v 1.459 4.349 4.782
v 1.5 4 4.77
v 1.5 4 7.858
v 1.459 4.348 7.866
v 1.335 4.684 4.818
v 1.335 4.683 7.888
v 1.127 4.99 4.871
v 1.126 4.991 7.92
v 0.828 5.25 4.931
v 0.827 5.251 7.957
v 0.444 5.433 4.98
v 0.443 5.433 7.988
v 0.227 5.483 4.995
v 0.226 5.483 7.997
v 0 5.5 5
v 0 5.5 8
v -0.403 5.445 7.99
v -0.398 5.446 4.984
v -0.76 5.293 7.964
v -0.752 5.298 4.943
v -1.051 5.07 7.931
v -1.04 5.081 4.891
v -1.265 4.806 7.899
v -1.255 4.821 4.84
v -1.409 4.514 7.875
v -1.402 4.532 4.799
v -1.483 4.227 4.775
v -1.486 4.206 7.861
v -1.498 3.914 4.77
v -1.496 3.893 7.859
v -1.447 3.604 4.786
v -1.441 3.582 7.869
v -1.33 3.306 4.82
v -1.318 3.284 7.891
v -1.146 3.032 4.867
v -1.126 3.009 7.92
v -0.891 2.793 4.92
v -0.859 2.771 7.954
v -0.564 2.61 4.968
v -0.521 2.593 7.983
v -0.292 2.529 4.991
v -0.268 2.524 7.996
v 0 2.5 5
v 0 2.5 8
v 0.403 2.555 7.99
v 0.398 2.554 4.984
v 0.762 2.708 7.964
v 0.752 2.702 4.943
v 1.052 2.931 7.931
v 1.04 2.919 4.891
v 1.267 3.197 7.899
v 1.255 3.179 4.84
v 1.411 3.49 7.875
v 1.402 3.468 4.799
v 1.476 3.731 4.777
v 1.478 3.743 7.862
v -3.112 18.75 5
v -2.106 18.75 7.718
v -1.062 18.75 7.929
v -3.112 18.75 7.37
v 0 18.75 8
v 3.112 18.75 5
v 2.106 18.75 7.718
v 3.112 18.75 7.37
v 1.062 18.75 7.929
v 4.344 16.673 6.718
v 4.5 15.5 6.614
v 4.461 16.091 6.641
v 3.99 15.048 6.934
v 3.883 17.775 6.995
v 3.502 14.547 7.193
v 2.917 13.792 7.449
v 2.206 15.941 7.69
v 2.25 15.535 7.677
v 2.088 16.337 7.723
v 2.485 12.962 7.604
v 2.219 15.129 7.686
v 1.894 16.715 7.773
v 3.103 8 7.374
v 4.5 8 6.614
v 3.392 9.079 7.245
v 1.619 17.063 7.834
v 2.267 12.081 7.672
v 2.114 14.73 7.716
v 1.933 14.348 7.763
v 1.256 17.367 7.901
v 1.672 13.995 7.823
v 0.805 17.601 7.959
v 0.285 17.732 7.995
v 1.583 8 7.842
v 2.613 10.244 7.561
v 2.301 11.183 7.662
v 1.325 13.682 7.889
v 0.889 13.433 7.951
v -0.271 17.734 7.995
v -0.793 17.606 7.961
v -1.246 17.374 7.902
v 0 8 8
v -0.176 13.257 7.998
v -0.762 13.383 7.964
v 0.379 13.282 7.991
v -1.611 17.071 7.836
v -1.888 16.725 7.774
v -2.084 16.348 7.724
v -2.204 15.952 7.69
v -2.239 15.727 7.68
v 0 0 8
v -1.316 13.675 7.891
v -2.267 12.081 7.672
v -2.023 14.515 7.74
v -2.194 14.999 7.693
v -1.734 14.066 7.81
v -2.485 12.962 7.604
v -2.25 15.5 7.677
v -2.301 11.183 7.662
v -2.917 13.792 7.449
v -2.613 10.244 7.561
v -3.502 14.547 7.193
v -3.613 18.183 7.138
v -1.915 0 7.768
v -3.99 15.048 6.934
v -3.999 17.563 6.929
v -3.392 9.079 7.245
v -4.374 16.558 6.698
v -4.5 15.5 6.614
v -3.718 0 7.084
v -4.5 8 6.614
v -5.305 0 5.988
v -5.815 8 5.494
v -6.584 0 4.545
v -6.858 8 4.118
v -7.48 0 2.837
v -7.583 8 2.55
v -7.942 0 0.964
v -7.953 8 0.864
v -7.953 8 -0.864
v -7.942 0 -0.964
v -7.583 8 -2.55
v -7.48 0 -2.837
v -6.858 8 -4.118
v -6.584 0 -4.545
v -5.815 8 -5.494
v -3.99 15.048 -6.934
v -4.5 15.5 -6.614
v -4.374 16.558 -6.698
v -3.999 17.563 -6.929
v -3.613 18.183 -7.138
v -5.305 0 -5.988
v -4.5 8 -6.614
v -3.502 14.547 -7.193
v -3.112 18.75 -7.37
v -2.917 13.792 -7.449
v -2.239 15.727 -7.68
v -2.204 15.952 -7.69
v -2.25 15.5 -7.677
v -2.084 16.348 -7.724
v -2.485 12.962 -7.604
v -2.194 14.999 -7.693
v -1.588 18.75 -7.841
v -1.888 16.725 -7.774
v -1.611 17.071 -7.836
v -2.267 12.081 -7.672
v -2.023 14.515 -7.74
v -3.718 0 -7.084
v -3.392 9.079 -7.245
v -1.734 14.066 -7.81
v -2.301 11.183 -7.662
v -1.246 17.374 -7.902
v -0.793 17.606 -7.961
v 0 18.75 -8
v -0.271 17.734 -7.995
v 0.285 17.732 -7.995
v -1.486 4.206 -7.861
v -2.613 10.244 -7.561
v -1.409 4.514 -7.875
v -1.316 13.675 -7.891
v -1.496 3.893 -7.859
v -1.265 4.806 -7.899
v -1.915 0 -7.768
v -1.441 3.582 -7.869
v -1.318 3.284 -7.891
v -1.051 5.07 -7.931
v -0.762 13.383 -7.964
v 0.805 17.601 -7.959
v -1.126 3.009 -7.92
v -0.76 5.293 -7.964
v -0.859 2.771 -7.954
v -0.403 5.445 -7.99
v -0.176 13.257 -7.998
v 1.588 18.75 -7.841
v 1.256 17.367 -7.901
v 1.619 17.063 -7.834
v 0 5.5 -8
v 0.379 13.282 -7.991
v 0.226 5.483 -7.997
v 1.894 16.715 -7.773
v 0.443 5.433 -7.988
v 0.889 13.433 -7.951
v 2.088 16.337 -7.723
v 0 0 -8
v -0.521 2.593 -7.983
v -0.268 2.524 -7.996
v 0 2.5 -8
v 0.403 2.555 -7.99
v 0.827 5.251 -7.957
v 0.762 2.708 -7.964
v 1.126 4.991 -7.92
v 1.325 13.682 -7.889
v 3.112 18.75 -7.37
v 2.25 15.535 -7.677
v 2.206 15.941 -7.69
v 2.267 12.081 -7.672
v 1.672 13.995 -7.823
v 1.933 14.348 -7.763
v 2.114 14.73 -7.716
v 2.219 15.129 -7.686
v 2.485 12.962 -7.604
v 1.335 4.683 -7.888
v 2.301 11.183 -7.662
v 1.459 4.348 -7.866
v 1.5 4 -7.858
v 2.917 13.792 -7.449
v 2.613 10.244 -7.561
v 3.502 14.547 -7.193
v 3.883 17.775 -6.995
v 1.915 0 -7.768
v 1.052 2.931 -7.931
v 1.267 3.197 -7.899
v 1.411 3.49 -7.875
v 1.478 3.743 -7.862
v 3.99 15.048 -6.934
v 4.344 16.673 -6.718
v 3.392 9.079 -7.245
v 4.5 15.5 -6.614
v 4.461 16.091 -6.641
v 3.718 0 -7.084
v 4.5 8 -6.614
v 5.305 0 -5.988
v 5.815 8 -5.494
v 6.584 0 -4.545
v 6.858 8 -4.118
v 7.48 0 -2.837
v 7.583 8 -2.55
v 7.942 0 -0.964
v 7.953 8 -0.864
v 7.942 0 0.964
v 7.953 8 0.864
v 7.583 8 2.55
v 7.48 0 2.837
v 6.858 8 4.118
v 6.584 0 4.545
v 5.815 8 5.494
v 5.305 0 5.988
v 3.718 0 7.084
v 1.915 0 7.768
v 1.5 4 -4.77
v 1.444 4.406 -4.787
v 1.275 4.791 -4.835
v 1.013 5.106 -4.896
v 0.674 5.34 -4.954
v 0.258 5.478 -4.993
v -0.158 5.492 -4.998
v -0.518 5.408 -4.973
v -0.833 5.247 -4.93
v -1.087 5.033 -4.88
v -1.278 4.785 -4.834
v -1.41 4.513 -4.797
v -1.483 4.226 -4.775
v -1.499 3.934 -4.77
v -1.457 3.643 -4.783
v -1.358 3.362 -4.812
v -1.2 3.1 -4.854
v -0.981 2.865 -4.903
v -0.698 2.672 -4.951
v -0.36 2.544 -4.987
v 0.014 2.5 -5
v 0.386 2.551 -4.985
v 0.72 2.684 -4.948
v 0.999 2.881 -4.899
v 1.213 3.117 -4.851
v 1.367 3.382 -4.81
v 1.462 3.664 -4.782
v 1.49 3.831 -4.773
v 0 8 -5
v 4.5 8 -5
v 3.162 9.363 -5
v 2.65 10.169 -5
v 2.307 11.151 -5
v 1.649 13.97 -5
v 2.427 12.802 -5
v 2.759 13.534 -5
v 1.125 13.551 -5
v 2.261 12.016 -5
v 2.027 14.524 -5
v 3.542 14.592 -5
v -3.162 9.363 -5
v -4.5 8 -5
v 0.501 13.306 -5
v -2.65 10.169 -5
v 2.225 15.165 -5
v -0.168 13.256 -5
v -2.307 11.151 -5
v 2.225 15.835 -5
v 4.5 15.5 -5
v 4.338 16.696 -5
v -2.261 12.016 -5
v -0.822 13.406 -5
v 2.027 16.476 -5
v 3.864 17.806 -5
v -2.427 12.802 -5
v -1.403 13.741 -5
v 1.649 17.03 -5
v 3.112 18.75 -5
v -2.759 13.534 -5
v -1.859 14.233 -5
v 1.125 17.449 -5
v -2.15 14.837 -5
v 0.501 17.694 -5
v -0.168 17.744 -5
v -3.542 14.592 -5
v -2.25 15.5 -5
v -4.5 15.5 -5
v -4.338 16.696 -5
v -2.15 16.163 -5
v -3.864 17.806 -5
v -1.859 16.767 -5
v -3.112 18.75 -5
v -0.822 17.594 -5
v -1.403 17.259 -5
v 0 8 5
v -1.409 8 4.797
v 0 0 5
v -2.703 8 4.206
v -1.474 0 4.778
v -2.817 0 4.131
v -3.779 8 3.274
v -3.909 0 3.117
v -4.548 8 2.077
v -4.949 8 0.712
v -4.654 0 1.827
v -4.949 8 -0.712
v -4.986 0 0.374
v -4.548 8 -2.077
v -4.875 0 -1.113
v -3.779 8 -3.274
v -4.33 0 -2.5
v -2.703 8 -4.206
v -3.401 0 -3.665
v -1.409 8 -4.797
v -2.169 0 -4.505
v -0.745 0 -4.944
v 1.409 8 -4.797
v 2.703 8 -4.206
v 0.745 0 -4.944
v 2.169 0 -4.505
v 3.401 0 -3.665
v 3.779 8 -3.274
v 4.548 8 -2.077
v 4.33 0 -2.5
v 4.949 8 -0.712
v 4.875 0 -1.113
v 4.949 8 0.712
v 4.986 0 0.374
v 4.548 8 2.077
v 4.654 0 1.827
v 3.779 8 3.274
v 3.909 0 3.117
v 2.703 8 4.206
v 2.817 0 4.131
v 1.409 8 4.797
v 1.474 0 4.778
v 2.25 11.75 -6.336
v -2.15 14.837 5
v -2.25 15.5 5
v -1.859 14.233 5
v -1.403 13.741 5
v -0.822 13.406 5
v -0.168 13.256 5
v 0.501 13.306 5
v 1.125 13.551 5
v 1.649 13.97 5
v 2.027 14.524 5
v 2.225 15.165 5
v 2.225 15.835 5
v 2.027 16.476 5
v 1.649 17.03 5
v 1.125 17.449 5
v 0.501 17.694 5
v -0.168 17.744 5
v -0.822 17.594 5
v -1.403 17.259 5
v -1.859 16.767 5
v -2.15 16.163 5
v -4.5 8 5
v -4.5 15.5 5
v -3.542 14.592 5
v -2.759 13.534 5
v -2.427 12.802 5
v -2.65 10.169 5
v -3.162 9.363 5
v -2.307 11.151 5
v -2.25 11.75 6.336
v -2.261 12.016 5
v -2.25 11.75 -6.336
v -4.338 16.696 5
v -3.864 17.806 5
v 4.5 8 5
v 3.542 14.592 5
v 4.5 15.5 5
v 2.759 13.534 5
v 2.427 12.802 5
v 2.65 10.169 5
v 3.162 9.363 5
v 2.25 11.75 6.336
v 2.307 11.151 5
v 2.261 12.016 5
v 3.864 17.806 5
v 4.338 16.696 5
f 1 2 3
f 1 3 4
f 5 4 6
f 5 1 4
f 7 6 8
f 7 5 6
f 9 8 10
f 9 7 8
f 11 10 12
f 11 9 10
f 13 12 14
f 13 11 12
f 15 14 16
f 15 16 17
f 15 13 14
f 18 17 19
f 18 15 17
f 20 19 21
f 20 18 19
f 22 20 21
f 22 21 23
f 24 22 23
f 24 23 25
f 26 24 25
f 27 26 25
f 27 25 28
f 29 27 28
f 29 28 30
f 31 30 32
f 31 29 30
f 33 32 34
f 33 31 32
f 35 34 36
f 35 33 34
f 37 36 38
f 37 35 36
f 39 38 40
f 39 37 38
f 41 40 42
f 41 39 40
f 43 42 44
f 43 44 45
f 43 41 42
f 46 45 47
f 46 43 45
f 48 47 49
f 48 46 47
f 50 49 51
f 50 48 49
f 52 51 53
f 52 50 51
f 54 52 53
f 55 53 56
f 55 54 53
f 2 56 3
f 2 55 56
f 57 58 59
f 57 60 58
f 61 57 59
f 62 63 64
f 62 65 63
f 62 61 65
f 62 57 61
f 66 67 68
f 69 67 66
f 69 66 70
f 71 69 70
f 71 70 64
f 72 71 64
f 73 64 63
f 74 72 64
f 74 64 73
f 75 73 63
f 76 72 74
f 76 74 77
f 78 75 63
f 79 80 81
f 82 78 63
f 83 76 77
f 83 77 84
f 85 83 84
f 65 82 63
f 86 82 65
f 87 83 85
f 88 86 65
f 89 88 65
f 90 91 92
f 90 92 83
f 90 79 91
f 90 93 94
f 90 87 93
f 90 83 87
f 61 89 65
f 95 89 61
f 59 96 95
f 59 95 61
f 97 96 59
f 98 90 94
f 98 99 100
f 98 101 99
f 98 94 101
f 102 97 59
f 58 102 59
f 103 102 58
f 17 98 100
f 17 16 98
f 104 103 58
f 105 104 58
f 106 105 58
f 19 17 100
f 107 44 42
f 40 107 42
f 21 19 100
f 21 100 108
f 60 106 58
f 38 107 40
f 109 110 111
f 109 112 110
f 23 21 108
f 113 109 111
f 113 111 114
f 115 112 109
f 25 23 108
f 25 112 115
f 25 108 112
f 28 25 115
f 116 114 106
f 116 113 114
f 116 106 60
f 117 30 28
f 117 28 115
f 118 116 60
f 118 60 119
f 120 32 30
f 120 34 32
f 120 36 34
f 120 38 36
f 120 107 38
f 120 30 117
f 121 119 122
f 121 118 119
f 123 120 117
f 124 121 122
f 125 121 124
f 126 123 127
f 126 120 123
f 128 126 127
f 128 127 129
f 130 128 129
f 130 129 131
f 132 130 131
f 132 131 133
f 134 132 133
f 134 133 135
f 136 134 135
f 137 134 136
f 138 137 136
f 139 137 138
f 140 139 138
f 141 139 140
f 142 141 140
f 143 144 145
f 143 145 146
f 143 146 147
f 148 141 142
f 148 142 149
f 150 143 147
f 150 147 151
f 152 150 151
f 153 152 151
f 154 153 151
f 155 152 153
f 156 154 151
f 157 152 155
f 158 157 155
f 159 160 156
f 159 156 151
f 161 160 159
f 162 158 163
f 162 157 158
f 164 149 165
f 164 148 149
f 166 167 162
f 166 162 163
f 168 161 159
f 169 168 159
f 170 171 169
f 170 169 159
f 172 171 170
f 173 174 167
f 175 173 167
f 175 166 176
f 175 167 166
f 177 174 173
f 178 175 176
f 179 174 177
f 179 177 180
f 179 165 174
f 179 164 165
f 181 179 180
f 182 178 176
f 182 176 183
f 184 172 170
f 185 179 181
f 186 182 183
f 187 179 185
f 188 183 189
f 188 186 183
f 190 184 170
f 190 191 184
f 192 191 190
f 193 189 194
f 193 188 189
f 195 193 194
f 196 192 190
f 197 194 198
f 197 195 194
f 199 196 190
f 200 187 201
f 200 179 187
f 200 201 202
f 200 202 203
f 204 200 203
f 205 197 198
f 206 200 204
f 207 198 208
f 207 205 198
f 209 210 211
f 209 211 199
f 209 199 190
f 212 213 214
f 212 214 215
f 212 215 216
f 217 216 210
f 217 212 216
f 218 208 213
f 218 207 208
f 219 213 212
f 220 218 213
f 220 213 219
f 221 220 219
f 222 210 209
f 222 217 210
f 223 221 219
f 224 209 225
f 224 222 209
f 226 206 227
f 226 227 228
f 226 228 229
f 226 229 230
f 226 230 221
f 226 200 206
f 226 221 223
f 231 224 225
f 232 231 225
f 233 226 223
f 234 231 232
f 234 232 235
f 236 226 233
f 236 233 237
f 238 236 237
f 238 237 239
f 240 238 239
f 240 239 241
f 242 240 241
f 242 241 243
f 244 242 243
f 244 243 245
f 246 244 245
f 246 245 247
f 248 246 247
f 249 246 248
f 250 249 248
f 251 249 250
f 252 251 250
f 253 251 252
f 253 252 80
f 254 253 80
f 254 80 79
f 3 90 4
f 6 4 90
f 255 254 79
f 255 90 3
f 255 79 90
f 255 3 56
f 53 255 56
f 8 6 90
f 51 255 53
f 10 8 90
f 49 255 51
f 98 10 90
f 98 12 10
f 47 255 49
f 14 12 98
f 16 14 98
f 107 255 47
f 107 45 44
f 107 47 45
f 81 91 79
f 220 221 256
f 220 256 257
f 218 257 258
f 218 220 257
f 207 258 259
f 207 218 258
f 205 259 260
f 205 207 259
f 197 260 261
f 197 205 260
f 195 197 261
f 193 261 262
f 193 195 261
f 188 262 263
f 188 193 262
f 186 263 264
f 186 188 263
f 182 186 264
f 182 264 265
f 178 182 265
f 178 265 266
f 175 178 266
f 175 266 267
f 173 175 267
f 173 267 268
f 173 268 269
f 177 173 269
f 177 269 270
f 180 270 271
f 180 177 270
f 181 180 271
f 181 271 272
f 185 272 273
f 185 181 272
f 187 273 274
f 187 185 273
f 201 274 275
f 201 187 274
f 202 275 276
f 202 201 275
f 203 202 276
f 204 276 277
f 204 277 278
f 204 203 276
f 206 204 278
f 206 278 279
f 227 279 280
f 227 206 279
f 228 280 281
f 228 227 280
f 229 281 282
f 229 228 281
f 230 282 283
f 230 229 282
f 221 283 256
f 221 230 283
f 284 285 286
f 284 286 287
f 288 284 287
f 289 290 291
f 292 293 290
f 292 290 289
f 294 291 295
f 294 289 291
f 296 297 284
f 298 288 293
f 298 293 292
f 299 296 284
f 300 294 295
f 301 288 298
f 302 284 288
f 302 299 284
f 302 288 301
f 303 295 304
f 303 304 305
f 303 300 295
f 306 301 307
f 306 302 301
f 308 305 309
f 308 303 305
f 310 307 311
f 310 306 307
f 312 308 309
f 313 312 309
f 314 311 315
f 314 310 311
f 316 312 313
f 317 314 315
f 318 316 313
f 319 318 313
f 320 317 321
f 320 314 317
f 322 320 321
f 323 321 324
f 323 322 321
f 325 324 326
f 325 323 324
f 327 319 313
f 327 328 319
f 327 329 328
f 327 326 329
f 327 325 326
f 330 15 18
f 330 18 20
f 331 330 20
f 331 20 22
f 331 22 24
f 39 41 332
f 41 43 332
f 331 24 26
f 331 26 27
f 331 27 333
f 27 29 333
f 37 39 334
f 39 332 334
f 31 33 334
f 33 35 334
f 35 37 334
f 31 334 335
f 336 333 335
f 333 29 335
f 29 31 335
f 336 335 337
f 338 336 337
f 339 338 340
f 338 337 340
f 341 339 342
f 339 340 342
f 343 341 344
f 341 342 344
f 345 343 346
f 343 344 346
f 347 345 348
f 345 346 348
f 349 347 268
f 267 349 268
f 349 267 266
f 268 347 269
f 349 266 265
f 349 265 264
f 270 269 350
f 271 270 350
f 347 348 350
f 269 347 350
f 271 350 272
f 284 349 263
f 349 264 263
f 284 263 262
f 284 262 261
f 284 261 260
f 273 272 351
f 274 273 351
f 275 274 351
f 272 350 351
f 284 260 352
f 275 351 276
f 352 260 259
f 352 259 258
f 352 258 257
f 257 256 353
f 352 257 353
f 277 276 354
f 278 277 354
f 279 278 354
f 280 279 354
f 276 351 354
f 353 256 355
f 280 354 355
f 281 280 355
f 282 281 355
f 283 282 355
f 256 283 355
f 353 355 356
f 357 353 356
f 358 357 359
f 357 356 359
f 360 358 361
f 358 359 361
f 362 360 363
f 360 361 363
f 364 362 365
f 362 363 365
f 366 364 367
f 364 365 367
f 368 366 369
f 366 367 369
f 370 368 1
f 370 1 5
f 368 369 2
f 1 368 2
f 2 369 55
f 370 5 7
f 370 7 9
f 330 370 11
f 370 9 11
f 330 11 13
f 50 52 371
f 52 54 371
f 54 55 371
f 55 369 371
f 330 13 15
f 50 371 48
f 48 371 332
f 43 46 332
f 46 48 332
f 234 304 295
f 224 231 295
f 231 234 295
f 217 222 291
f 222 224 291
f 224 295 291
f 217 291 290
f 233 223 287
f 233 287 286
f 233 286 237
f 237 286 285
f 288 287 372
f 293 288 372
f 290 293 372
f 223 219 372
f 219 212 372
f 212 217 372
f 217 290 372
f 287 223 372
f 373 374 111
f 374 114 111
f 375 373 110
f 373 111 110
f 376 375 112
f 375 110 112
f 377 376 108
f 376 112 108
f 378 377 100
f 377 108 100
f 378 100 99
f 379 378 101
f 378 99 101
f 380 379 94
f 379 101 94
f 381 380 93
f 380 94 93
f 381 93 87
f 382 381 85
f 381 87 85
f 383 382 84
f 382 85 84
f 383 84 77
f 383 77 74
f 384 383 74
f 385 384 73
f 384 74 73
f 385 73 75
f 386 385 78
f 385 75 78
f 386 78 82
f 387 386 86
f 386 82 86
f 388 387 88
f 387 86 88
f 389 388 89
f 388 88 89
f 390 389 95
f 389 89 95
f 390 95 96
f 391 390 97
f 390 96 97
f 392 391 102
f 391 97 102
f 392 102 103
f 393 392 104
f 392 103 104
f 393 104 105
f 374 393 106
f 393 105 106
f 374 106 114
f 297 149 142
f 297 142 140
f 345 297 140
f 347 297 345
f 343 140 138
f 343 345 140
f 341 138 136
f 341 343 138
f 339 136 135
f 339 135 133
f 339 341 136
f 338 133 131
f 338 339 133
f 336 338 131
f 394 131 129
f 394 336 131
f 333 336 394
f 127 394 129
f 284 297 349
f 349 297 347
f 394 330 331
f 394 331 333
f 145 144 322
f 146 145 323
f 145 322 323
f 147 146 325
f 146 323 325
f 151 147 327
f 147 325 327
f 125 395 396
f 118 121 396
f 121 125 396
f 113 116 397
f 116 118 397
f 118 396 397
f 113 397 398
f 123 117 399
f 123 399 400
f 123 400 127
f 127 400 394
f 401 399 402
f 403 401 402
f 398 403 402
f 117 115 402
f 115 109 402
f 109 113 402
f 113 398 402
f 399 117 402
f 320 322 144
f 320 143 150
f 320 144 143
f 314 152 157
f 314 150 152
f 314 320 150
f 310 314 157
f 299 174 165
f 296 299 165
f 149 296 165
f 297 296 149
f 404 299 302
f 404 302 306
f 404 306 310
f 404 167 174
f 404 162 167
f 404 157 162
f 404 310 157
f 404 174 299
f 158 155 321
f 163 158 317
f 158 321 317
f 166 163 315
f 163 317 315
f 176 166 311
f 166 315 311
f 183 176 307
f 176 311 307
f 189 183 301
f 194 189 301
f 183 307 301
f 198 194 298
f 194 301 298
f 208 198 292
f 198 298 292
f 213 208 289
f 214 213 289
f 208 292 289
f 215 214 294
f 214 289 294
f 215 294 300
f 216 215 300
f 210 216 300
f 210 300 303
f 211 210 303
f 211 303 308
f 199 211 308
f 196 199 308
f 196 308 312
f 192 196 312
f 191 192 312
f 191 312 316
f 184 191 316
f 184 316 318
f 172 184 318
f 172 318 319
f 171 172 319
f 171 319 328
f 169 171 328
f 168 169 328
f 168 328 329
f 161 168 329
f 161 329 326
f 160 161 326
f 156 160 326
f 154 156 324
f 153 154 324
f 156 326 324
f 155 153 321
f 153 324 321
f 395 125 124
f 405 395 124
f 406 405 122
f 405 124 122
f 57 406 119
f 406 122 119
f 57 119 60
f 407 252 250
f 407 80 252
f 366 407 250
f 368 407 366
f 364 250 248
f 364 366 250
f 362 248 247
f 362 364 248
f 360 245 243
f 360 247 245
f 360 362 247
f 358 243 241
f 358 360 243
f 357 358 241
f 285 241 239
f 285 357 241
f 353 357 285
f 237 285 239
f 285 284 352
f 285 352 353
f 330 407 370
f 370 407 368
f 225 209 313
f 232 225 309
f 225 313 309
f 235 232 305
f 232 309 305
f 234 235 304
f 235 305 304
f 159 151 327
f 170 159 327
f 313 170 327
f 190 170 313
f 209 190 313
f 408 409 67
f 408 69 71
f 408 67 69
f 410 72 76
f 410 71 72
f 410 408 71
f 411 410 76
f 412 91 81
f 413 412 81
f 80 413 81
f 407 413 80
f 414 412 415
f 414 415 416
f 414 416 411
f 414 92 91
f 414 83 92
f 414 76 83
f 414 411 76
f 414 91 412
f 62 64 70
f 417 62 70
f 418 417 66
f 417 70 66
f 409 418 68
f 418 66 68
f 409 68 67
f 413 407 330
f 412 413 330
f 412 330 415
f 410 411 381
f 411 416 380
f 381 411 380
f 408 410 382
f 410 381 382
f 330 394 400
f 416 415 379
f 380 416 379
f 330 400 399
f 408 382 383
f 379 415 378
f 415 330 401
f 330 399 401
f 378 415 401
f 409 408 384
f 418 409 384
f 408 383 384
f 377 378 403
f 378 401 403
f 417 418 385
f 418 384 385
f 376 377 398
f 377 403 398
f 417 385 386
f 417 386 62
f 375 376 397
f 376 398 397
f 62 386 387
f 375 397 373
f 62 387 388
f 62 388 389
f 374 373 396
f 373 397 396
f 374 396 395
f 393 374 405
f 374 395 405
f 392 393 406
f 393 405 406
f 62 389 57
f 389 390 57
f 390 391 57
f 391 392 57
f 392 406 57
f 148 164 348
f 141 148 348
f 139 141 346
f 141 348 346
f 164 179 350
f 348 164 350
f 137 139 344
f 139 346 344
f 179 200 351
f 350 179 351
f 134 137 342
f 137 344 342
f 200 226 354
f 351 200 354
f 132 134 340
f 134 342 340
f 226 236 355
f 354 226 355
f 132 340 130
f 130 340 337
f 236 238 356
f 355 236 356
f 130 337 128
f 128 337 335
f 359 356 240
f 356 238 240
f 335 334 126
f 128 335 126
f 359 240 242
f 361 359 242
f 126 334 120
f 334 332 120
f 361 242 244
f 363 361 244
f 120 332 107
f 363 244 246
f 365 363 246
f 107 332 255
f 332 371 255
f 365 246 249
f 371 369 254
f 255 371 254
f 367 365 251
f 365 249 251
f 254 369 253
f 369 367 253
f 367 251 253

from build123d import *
from build123d.topology import SkipClean

# Parameters (mm, degrees)
SKETCH2_R                            = 8
SKETCH2_R_2                          = 5
BOSS_EXTRUDE1_DEPTH                  = 8
BOSS_EXTRUDE2_REACH                  = 15.856
BOSS_EXTRUDE2_END_RADIUS             = 8
SKETCH3_R                            = 2.25
BOSS_EXTRUDE2_DIRECTION_2_REACH      = 15.856
BOSS_EXTRUDE2_DIRECTION_2_END_RADIUS = 8
SKETCH4_R                            = 5
CUT_EXTRUDE1_DEPTH                   = 23.978250708
CUT_EXTRUDE2_DEPTH                   = 23.978250708
CUT_EXTRUDE2_DEPTH_BACK              = 23.978250708
SKETCH5_W                            = 10
SKETCH5_H                            = 12
CUT_EXTRUDE3_DEPTH                   = 23.978250708
CUT_EXTRUDE3_DEPTH_BACK              = 23.978250708
SKETCH6_R                            = 1.5
CUT_EXTRUDE4_DEPTH                   = 23.978250752
CUT_EXTRUDE4_DEPTH_BACK              = 23.978250752


with BuildPart() as part:
    # Sketch2 → Boss-Extrude1 (new body)
    with BuildSketch(Plane(origin=(0, 0, 0), x_dir=(1, 0, 0), z_dir=(0, 1, 0))):
        with Locations(Location((0, 0, 0), (0, 0, 270))):
            Circle(SKETCH2_R)
        with Locations(Location((0, 0, 0), (0, 0, 270))):
            Circle(SKETCH2_R_2, mode=Mode.SUBTRACT)
    extrude(amount=BOSS_EXTRUDE1_DEPTH)

    # Boss-Extrude2: up to this cylinder (the profile starts inside it)
    boss_extrude2_end = Plane(origin=(0, 11.750122, 0), z_dir=(0, -1, 0)) * Cylinder(BOSS_EXTRUDE2_END_RADIUS, 48.712, mode=Mode.PRIVATE)
    # Sketch3 → Boss-Extrude2 (add, up to the surface)
    with BuildSketch(Plane.XY, mode=Mode.PRIVATE) as boss_extrude2_sk1:
        with BuildLine():
            Line((0, 8), (-4.5, 8))
            add(Edge.make_bspline(
                [(-4.5, 15.5), (0, 11.75), (-4.5, 8)],
                knots=[0, 0, 0, 1, 1, 1], degree=2))
            ThreePointArc((-4.5, 15.5), (0, 20), (4.5, 15.5))
            add(Edge.make_bspline(
                [(4.5, 15.5), (0, 11.75), (4.5, 8)],
                knots=[0, 0, 0, 1, 1, 1], degree=2))
            Line((4.5, 8), (0, 8))
        make_face()
        with Locations(Location((0, 15.5, 0), (0, 0, 180))):
            Circle(SKETCH3_R, mode=Mode.SUBTRACT)
    boss_extrude2_tool1 = extrude(boss_extrude2_sk1.sketch, amount=BOSS_EXTRUDE2_REACH, mode=Mode.PRIVATE) & boss_extrude2_end
    add(boss_extrude2_tool1.solids().sort_by_distance((2.1, 11.750122, 0))[0])

    # Boss-Extrude2 direction 2: up to this cylinder (the profile starts inside it)
    boss_extrude2_direction_2_end = Plane(origin=(0, 11.750122, 0), z_dir=(0, -1, 0)) * Cylinder(BOSS_EXTRUDE2_DIRECTION_2_END_RADIUS, 48.712, mode=Mode.PRIVATE)
    # Sketch3 → Boss-Extrude2 direction 2 (add, up to the surface)
    with BuildSketch(Plane.XY, mode=Mode.PRIVATE) as boss_extrude2_direction_2_sk1:
        with BuildLine():
            Line((0, 8), (-4.5, 8))
            add(Edge.make_bspline(
                [(-4.5, 15.5), (0, 11.75), (-4.5, 8)],
                knots=[0, 0, 0, 1, 1, 1], degree=2))
            ThreePointArc((-4.5, 15.5), (0, 20), (4.5, 15.5))
            add(Edge.make_bspline(
                [(4.5, 15.5), (0, 11.75), (4.5, 8)],
                knots=[0, 0, 0, 1, 1, 1], degree=2))
            Line((4.5, 8), (0, 8))
        make_face()
        with Locations(Location((0, 15.5, 0), (0, 0, 180))):
            Circle(SKETCH3_R, mode=Mode.SUBTRACT)
    boss_extrude2_direction_2_tool1 = extrude(boss_extrude2_direction_2_sk1.sketch, amount=-BOSS_EXTRUDE2_DIRECTION_2_REACH, mode=Mode.PRIVATE) & boss_extrude2_direction_2_end
    add(boss_extrude2_direction_2_tool1.solids().sort_by_distance((2.1, 11.750122, 0))[0])

    # Sketch4 → Cut-Extrude1 (cut, through all)
    with BuildSketch(Plane.XZ):
        with Locations(Location((0, 0, 0), (0, 0, 90))):
            Circle(SKETCH4_R)
    extrude(amount=-CUT_EXTRUDE1_DEPTH, mode=Mode.SUBTRACT)

    # Sketch5 → Cut-Extrude2 (cut, two sides: drawn at the far end of the back side and taken through both)
    with BuildSketch(Plane(origin=(0, 0, 0), x_dir=(0, 0, -1), z_dir=(1, 0, 0)).offset(-CUT_EXTRUDE2_DEPTH_BACK)):
        with Locations((0, 14)):
            Rectangle(SKETCH5_W, SKETCH5_H)
    extrude(amount=CUT_EXTRUDE2_DEPTH + CUT_EXTRUDE2_DEPTH_BACK, mode=Mode.SUBTRACT)

    # Sketch6 → Cut-Extrude3 (cut, two sides: drawn at the far end of the back side and taken through both)
    with SkipClean():  # the faces are left unmerged after this step: merging them gives an invalid solid
        with BuildSketch(Plane.XY.offset(-CUT_EXTRUDE3_DEPTH_BACK)):
            with Locations((0, 4)):
                Circle(SKETCH6_R)
        extrude(amount=CUT_EXTRUDE3_DEPTH + CUT_EXTRUDE3_DEPTH_BACK, mode=Mode.SUBTRACT)

    # Sketch7 → Cut-Extrude4 (cut, two sides: drawn at the far end of the back side and taken through both)
    with SkipClean():  # the faces are left unmerged after this step: merging them gives an invalid solid
        with BuildSketch(Plane.XY.offset(-CUT_EXTRUDE4_DEPTH_BACK)):
            with BuildLine():
                Line((-3.112474899, 18.75), (3.112474899, 18.75))
                ThreePointArc((3.112474899, 18.75), (0, 20), (-3.112474899, 18.75))
            make_face()
        extrude(amount=CUT_EXTRUDE4_DEPTH + CUT_EXTRUDE4_DEPTH_BACK, mode=Mode.SUBTRACT)


solid = part.part
